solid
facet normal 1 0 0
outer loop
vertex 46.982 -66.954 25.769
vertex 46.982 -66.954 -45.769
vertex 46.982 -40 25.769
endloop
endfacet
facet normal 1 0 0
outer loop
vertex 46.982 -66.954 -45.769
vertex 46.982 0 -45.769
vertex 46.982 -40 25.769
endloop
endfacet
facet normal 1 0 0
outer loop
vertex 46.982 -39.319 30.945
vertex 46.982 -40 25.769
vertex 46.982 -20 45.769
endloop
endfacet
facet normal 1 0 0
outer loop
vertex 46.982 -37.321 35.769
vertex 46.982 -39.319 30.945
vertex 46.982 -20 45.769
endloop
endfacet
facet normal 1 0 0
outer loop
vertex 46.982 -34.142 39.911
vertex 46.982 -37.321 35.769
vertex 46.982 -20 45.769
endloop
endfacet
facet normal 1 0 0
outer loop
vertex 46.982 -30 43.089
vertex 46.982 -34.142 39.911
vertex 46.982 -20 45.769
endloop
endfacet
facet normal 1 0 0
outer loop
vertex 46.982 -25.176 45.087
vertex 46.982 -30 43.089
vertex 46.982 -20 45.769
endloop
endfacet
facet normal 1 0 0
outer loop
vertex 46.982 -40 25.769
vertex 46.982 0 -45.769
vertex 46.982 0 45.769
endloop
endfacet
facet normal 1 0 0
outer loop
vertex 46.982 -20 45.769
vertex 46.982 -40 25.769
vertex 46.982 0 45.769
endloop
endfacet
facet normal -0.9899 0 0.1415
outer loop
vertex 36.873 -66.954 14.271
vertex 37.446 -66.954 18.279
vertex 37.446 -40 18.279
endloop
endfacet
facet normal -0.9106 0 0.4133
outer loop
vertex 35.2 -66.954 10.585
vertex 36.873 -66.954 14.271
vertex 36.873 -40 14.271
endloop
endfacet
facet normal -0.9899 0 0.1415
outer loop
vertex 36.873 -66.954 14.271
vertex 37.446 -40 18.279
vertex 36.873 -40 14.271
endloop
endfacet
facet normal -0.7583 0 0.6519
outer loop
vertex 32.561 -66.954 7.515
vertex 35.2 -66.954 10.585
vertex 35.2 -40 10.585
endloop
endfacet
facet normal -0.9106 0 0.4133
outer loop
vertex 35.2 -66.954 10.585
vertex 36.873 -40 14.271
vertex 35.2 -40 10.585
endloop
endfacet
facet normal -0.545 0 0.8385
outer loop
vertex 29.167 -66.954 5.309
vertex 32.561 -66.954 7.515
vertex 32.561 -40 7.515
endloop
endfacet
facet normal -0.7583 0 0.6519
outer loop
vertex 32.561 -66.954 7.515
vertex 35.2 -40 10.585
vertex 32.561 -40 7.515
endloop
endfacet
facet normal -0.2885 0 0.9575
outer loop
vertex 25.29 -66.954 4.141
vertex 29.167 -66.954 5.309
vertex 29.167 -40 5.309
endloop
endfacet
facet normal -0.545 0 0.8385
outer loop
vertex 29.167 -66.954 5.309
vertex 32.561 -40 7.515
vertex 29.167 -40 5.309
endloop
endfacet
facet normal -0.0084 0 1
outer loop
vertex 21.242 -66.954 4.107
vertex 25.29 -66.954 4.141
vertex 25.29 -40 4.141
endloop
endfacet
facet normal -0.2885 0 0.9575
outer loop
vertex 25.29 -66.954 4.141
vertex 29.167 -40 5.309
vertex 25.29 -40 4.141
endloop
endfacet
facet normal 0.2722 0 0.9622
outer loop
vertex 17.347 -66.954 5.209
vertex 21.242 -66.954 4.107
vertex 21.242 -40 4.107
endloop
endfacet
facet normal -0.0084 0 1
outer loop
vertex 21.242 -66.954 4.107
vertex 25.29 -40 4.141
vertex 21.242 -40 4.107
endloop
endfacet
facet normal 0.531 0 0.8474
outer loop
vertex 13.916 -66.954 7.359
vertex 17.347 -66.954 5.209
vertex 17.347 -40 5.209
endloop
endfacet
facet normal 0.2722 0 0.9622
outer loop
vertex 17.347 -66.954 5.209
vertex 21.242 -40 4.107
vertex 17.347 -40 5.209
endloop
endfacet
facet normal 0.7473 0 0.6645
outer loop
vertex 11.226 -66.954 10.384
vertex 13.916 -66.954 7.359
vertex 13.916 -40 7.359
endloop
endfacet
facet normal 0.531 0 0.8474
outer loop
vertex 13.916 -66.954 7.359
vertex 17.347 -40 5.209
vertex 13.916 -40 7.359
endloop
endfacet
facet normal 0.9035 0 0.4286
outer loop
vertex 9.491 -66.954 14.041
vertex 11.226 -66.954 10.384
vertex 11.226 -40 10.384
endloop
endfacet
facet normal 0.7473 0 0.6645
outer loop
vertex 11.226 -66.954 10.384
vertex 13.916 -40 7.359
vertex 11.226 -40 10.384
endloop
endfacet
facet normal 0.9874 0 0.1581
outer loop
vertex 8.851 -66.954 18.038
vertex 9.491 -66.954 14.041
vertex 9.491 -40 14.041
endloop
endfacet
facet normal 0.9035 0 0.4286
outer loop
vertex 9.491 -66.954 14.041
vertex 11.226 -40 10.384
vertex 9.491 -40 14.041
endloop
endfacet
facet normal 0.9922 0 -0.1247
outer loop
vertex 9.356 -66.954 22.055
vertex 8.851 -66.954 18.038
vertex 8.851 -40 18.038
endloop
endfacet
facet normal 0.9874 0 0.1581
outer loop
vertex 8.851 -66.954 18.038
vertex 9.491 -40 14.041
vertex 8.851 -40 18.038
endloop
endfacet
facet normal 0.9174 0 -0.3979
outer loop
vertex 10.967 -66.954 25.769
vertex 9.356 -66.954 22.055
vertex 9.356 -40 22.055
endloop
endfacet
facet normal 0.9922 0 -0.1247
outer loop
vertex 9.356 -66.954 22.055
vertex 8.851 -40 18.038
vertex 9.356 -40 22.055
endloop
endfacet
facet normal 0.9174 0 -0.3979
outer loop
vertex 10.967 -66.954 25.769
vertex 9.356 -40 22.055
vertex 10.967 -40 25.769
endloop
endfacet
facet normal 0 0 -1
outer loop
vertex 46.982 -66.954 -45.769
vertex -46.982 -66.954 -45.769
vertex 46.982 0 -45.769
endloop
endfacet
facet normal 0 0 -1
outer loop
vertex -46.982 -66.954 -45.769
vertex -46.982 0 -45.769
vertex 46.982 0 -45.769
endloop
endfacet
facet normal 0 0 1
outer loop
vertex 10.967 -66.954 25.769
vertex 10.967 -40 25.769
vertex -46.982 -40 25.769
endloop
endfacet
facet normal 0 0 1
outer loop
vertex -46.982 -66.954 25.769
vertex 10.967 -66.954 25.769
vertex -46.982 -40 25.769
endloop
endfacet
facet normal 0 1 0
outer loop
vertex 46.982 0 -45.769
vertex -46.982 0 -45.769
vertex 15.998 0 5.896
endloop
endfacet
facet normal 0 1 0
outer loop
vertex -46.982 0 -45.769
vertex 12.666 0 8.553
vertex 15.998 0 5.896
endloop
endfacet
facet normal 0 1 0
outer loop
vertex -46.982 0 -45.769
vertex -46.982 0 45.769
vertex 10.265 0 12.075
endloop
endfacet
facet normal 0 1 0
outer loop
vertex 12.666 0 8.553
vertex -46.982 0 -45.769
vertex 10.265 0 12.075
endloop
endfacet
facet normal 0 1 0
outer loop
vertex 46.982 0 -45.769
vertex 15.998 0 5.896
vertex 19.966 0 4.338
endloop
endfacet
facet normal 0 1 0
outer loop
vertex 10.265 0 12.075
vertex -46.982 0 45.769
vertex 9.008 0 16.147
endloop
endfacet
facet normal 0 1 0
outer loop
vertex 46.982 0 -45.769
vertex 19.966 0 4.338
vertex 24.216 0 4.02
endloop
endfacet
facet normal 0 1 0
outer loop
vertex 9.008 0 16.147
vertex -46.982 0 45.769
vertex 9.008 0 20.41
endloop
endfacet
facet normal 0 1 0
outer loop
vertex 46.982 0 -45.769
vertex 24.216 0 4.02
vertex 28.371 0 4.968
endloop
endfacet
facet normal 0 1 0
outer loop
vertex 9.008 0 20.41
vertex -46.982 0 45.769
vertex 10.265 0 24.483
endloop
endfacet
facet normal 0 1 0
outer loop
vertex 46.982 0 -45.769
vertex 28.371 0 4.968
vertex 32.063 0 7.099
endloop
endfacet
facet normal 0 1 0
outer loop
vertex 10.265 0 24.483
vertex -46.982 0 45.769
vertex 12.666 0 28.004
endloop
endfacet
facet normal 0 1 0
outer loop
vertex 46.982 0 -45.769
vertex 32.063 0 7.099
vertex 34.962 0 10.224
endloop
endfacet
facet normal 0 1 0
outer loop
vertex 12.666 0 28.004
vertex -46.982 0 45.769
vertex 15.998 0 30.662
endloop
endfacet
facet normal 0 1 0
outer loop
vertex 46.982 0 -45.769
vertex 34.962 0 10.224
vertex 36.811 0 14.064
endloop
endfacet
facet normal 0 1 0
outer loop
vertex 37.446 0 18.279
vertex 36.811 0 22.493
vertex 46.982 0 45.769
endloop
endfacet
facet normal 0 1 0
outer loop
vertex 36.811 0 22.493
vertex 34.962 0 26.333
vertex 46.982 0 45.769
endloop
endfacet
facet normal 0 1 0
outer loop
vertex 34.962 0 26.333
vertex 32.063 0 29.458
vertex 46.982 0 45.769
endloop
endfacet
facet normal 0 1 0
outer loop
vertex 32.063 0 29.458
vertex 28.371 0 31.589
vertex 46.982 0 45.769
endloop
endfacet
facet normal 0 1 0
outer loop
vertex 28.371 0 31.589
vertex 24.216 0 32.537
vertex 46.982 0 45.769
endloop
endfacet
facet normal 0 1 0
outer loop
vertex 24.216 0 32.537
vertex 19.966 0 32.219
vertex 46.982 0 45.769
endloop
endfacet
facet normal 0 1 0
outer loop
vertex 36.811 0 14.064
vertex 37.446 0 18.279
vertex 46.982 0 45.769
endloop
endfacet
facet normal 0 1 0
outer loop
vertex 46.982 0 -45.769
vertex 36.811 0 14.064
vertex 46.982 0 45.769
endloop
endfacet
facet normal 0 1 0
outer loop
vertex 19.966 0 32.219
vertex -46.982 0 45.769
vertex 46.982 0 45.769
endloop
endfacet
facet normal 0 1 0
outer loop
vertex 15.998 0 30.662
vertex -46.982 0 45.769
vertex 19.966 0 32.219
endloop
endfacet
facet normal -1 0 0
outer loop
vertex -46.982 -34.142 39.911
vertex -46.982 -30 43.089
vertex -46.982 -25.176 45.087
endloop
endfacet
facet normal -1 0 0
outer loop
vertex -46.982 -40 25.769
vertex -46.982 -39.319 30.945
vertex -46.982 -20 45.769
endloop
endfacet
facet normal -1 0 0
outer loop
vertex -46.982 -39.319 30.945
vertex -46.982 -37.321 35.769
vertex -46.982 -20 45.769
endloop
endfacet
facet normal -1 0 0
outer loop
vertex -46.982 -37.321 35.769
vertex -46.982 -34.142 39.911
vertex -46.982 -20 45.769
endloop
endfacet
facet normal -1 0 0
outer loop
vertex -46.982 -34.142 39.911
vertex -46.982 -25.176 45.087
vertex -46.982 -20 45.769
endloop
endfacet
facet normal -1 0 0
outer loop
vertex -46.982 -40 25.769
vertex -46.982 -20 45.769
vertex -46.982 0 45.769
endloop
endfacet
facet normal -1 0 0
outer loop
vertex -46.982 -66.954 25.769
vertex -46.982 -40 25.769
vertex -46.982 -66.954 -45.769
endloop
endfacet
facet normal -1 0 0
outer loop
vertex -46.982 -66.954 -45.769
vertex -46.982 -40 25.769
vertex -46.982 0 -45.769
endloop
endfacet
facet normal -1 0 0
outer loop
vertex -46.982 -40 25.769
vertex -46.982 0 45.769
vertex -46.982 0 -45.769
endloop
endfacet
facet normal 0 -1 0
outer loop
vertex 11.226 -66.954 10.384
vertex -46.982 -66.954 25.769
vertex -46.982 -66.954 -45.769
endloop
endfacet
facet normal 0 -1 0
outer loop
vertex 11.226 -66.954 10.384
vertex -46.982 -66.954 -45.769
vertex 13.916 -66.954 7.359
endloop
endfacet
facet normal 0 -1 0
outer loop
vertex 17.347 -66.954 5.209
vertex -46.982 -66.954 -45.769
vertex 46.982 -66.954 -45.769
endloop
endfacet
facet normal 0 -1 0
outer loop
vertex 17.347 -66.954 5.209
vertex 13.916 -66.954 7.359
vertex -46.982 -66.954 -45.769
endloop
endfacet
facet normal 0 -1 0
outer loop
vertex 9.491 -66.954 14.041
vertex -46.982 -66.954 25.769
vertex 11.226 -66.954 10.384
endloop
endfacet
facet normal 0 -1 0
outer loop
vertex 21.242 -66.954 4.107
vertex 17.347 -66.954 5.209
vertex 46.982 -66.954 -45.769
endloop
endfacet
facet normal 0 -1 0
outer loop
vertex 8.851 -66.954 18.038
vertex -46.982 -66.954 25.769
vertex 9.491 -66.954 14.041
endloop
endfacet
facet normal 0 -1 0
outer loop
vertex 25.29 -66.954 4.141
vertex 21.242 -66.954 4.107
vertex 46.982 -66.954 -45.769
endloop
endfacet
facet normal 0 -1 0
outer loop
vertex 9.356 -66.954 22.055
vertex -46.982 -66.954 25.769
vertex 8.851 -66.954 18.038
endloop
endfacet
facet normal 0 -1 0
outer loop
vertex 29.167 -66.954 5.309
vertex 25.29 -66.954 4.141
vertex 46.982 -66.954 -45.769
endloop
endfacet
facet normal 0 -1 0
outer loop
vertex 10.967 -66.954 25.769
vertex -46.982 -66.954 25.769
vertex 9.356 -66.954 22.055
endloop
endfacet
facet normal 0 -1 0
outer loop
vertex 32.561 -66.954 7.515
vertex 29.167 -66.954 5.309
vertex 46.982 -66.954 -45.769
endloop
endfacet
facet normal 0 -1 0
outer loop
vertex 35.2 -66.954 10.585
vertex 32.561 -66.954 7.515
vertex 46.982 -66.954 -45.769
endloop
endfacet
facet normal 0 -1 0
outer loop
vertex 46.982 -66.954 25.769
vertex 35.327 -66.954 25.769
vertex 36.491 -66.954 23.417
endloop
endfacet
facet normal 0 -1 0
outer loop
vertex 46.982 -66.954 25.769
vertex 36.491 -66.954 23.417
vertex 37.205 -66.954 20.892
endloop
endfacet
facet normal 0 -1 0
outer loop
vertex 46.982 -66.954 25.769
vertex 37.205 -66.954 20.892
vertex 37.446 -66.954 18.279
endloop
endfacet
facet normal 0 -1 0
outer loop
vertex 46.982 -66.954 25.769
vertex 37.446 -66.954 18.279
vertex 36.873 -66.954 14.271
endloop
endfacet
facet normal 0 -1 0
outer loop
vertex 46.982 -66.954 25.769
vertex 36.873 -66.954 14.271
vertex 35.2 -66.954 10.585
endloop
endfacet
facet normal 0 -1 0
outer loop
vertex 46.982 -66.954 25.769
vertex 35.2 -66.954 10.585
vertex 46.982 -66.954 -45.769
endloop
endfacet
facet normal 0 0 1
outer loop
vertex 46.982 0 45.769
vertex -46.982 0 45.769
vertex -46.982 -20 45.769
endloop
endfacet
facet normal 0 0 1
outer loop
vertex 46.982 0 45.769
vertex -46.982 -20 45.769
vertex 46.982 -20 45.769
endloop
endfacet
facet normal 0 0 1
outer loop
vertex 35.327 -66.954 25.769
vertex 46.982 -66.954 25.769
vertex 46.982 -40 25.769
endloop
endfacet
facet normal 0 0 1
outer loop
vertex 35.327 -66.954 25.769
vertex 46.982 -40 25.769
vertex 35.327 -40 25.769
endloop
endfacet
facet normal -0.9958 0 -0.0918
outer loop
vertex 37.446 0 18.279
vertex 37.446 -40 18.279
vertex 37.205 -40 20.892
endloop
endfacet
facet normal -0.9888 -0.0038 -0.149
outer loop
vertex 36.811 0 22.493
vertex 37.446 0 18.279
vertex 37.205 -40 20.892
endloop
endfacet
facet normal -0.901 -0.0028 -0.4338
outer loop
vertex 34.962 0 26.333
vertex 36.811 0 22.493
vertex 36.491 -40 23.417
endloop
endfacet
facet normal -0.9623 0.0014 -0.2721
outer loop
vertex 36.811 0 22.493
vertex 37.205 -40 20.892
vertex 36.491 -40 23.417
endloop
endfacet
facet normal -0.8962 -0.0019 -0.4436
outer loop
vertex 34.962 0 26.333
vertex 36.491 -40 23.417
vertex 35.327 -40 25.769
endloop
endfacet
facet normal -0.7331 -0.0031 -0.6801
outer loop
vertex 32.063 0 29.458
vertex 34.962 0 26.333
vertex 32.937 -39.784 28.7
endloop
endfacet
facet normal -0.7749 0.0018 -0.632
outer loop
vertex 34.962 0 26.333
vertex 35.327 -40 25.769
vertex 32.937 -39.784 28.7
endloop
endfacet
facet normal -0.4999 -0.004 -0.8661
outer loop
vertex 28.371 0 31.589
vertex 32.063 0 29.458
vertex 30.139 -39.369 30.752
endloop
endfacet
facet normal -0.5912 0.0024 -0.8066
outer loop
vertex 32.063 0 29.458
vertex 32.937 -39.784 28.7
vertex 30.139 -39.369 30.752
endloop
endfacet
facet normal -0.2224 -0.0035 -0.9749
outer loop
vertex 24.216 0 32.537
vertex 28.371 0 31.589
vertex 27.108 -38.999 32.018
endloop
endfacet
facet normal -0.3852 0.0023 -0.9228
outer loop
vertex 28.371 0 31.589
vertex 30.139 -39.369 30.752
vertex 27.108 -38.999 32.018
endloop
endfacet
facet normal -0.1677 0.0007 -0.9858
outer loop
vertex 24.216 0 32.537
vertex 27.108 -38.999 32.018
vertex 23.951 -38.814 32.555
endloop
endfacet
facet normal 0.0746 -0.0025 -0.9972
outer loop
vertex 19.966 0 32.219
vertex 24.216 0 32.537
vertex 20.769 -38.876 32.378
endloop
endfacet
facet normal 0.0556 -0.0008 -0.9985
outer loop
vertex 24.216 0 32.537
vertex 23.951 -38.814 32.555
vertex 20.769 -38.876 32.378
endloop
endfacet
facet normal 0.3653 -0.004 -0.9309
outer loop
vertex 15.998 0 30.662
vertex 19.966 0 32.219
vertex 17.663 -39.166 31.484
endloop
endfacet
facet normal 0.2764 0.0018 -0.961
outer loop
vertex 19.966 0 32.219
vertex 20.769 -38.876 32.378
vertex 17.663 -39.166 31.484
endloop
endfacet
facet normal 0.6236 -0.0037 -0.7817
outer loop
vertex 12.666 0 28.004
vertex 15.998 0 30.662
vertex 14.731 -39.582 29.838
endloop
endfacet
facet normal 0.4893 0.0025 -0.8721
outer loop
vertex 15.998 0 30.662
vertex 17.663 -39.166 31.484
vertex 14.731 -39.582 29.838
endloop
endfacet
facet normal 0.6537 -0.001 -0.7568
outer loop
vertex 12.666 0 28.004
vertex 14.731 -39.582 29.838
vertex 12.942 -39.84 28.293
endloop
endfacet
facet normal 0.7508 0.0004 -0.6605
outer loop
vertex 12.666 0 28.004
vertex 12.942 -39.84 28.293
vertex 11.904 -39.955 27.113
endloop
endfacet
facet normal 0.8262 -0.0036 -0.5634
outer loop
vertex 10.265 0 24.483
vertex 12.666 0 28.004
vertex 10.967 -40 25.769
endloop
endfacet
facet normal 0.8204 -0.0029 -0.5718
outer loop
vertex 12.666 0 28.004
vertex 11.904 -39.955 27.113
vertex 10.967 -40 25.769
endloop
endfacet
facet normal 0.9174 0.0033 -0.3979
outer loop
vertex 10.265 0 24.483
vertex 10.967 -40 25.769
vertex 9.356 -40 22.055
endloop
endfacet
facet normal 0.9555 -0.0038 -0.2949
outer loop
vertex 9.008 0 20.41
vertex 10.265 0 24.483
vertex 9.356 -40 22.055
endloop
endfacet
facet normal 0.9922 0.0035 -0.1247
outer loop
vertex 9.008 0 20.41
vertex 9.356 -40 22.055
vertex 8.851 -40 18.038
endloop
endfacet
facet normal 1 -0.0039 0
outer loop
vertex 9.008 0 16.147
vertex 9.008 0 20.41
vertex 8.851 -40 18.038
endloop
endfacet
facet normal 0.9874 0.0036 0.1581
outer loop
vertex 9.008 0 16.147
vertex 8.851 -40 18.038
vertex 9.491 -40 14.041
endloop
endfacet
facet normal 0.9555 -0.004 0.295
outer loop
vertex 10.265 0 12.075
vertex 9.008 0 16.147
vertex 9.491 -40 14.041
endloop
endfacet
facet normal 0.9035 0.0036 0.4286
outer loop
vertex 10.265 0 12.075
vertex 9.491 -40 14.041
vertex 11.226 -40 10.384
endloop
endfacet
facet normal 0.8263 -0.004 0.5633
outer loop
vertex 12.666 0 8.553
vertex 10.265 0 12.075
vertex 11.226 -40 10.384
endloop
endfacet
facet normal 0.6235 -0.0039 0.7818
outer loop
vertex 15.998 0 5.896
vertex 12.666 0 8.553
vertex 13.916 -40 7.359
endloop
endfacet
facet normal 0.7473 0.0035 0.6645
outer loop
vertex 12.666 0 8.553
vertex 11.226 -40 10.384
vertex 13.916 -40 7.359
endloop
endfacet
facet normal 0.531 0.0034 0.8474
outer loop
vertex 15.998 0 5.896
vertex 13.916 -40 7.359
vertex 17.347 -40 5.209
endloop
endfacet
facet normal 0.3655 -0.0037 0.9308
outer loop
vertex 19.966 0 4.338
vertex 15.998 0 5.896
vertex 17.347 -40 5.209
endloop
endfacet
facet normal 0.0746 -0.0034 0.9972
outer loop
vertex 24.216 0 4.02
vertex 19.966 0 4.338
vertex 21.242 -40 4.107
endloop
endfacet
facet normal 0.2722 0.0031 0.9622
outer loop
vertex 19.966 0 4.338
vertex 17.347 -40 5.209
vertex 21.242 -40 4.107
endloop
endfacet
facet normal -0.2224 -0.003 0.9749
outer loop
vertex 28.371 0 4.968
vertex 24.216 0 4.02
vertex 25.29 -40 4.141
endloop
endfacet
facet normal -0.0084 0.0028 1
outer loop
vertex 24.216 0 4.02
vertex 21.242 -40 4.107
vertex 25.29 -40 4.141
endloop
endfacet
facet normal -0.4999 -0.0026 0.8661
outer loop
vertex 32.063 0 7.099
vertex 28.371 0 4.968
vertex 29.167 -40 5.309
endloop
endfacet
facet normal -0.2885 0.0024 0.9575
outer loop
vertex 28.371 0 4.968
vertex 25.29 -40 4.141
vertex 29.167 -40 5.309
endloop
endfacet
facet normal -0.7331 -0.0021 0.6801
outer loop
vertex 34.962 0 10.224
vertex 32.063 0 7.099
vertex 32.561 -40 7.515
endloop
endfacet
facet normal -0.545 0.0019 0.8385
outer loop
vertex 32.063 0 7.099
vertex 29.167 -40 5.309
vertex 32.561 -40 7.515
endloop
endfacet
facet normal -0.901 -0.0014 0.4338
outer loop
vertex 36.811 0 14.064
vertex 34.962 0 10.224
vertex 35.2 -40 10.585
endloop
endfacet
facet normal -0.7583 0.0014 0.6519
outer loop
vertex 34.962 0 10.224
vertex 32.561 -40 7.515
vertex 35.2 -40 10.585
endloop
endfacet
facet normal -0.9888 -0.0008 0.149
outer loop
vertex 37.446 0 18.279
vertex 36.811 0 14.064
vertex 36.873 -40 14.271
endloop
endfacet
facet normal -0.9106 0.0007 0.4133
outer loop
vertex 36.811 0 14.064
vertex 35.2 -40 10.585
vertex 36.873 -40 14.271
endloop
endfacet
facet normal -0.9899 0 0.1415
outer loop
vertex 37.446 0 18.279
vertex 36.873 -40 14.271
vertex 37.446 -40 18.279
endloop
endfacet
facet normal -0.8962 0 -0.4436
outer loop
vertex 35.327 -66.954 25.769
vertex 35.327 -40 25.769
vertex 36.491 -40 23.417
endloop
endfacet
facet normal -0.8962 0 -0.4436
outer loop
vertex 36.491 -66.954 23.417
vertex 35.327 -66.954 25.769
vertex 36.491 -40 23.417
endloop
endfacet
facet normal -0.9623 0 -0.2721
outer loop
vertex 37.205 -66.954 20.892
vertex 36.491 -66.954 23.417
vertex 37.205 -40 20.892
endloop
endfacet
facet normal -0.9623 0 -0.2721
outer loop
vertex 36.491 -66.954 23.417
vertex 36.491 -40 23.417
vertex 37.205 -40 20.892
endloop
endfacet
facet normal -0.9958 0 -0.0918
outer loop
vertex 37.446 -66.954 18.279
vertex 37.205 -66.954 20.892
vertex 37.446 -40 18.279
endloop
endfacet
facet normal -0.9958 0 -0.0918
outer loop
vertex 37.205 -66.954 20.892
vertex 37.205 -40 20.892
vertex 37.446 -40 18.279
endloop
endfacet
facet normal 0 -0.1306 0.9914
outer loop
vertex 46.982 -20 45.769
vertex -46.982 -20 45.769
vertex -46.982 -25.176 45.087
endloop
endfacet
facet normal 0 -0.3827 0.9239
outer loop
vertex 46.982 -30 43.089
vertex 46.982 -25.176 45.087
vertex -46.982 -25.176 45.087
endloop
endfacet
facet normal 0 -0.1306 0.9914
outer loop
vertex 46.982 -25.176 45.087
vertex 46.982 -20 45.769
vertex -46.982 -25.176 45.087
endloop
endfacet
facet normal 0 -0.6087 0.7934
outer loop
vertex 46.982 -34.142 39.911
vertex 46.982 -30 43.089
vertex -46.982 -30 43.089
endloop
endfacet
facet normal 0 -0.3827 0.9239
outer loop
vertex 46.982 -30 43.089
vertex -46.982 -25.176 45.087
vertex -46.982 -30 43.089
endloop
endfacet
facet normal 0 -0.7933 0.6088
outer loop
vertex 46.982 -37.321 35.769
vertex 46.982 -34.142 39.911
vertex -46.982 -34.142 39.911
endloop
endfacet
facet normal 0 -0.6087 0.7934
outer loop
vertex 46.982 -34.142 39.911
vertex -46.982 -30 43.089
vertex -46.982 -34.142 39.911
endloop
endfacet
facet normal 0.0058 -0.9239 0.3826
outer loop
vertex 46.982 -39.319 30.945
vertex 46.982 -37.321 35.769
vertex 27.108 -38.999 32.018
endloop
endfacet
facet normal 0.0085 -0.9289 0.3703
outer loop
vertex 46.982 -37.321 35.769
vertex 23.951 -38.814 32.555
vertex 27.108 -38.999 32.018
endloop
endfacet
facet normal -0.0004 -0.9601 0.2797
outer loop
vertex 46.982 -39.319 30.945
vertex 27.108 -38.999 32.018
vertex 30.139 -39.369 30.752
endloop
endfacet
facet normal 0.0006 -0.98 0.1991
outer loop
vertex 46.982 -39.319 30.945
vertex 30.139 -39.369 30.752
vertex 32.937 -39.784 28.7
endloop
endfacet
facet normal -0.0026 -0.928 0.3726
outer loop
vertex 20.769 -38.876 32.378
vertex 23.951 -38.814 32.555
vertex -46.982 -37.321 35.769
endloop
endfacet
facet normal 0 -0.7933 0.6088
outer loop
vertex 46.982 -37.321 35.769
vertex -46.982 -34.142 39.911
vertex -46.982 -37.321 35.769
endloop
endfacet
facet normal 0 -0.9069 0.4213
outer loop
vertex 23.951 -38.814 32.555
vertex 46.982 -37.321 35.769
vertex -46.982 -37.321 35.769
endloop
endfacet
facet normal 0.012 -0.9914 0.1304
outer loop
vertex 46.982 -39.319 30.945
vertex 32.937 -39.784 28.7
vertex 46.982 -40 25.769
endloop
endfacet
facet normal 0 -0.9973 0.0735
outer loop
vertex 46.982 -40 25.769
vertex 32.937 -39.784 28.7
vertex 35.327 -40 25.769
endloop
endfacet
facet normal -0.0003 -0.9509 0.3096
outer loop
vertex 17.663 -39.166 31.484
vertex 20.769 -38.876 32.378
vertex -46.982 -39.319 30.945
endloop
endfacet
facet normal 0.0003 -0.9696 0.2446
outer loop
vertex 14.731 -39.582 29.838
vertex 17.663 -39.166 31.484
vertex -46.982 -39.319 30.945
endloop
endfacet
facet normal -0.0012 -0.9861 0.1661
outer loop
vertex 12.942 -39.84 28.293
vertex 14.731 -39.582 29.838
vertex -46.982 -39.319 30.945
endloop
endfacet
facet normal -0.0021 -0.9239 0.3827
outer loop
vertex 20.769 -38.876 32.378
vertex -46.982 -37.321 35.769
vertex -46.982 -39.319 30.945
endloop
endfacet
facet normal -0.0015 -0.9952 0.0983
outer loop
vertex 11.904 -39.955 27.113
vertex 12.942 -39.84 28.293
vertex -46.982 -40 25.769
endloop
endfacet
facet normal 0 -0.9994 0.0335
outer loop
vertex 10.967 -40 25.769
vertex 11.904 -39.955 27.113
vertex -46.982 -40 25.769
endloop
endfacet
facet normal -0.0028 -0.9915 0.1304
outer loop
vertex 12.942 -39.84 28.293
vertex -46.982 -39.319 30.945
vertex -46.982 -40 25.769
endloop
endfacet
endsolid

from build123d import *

# Parameters (mm, degrees)
F0_W        = 93.9634628594
F0_H        = 91.5375761688
F1_DEPTH    = 40
F2_R        = 14.2987523314
F3_DEPTH    = 64.5675584674
F4_T1_DEPTH = 193.9634628594
F6_DEPTH    = 26.9540566951


# Not quite as in the source:
# - a fillet or chamfer that OpenCascade refuses, or shapes differently, is made with other operations: its cross-section is extruded or revolved along the edge and cut away or added


with BuildPart() as f1:
    # F0 (on Front) → F1 (new body)
    with BuildSketch(Plane.XZ):
        Rectangle(F0_W, F0_H)
    extrude(amount=F1_DEPTH)

    # F2 (on face) → F3 (cut)
    with BuildSketch(Plane.XZ.offset(40)):
        with Locations((23.1474172324, 18.2785931975)):
            Circle(F2_R)
    extrude(amount=-F3_DEPTH, mode=Mode.SUBTRACT)

    # F4: fillet of radius 20 on 1 edges, made by hand

    # F4_s2 → F4_t1 (cut)
    with BuildSketch(Plane.YZ.offset(-96.9817314297)):
        with BuildLine():
            ThreePointArc((-20, 45.7687880844), (-34.1421356237, 39.9109237081), (-40, 25.7687880844))
            Line((-40, 25.7687880844), (-40, 45.7687880844))
            Line((-40, 45.7687880844), (-20, 45.7687880844))
        make_face()
    extrude(amount=F4_T1_DEPTH, mode=Mode.SUBTRACT)

    # F5 (on face) → F6 (join)
    with BuildSketch(Plane.XZ.offset(40)):
        with BuildLine():
            Line((-46.9817314297, 25.7687880844), (-46.9817314297, -45.7687880844))
            Line((-46.9817314297, -45.7687880844), (46.9817314297, -45.7687880844))
            Line((46.9817314297, -45.7687880844), (46.9817314297, 25.7687880844))
            Line((46.9817314297, 25.7687880844), (35.3273720267, 25.7687880844))
            ThreePointArc((35.3273720267, 25.7687880844), (36.9062775639, 22.1706467187), (37.4461695638, 18.2785931975))
            ThreePointArc((37.4461695638, 18.2785931975), (19.2553637112, 4.5197328659), (10.9674624381, 25.7687880844))
            Line((10.9674624381, 25.7687880844), (-46.9817314297, 25.7687880844))
        make_face()
    extrude(amount=F6_DEPTH)


solid = f1.part
